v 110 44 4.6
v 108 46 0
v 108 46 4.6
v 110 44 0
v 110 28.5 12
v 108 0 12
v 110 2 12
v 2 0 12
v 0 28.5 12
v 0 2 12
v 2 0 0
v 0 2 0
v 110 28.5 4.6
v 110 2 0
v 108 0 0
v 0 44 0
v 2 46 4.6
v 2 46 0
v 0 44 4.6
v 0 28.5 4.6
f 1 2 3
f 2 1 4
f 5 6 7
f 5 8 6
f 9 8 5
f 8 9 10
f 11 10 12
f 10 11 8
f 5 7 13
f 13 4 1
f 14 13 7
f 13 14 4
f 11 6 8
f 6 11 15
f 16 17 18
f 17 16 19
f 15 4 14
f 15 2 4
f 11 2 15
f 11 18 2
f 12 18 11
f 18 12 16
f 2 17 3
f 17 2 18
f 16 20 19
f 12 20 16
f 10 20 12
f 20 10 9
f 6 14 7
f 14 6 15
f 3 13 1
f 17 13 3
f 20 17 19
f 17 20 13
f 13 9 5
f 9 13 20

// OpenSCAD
$fn = 32;

// ----------------------------------------------------------------------
// Stepped bar: sidestep, 110 x 46 x 12/4.6 mm
// ----------------------------------------------------------------------

// --- parameters (mm) ---
bar_l = 110;              // bar length, X
bar_w = 46;               // bar width, Y
plate_t = 12;             // thickness of the thick zone, Z
thin_t = 4.6;             // thickness of the thin zone
corner_c = 2;             // corner chamfer of the bar
step_cut = 7.4;           // material removed from the thin zone
ledge_y = 28.5;           // start of the ledge from the front edge
depth_1 = 7.4;            // depth of cut 1 from the top face

profile = [[2, 0], [108, 0], [110, 2], [110, 44], [108, 46], [2, 46], [0, 44], [0, 2]];  // primary outline, 8 points, counter clockwise
void_1 = [[-1, 28.5], [111, 28.5], [111, 47], [-1, 47]];  // ledge cut along one edge, 4 points

// --- the one profile operation ---
difference() {
  linear_extrude(height = plate_t) polygon(points = profile);
  translate([0, 0, plate_t - depth_1])
    linear_extrude(height = depth_1 + 1) polygon(points = void_1);
}
